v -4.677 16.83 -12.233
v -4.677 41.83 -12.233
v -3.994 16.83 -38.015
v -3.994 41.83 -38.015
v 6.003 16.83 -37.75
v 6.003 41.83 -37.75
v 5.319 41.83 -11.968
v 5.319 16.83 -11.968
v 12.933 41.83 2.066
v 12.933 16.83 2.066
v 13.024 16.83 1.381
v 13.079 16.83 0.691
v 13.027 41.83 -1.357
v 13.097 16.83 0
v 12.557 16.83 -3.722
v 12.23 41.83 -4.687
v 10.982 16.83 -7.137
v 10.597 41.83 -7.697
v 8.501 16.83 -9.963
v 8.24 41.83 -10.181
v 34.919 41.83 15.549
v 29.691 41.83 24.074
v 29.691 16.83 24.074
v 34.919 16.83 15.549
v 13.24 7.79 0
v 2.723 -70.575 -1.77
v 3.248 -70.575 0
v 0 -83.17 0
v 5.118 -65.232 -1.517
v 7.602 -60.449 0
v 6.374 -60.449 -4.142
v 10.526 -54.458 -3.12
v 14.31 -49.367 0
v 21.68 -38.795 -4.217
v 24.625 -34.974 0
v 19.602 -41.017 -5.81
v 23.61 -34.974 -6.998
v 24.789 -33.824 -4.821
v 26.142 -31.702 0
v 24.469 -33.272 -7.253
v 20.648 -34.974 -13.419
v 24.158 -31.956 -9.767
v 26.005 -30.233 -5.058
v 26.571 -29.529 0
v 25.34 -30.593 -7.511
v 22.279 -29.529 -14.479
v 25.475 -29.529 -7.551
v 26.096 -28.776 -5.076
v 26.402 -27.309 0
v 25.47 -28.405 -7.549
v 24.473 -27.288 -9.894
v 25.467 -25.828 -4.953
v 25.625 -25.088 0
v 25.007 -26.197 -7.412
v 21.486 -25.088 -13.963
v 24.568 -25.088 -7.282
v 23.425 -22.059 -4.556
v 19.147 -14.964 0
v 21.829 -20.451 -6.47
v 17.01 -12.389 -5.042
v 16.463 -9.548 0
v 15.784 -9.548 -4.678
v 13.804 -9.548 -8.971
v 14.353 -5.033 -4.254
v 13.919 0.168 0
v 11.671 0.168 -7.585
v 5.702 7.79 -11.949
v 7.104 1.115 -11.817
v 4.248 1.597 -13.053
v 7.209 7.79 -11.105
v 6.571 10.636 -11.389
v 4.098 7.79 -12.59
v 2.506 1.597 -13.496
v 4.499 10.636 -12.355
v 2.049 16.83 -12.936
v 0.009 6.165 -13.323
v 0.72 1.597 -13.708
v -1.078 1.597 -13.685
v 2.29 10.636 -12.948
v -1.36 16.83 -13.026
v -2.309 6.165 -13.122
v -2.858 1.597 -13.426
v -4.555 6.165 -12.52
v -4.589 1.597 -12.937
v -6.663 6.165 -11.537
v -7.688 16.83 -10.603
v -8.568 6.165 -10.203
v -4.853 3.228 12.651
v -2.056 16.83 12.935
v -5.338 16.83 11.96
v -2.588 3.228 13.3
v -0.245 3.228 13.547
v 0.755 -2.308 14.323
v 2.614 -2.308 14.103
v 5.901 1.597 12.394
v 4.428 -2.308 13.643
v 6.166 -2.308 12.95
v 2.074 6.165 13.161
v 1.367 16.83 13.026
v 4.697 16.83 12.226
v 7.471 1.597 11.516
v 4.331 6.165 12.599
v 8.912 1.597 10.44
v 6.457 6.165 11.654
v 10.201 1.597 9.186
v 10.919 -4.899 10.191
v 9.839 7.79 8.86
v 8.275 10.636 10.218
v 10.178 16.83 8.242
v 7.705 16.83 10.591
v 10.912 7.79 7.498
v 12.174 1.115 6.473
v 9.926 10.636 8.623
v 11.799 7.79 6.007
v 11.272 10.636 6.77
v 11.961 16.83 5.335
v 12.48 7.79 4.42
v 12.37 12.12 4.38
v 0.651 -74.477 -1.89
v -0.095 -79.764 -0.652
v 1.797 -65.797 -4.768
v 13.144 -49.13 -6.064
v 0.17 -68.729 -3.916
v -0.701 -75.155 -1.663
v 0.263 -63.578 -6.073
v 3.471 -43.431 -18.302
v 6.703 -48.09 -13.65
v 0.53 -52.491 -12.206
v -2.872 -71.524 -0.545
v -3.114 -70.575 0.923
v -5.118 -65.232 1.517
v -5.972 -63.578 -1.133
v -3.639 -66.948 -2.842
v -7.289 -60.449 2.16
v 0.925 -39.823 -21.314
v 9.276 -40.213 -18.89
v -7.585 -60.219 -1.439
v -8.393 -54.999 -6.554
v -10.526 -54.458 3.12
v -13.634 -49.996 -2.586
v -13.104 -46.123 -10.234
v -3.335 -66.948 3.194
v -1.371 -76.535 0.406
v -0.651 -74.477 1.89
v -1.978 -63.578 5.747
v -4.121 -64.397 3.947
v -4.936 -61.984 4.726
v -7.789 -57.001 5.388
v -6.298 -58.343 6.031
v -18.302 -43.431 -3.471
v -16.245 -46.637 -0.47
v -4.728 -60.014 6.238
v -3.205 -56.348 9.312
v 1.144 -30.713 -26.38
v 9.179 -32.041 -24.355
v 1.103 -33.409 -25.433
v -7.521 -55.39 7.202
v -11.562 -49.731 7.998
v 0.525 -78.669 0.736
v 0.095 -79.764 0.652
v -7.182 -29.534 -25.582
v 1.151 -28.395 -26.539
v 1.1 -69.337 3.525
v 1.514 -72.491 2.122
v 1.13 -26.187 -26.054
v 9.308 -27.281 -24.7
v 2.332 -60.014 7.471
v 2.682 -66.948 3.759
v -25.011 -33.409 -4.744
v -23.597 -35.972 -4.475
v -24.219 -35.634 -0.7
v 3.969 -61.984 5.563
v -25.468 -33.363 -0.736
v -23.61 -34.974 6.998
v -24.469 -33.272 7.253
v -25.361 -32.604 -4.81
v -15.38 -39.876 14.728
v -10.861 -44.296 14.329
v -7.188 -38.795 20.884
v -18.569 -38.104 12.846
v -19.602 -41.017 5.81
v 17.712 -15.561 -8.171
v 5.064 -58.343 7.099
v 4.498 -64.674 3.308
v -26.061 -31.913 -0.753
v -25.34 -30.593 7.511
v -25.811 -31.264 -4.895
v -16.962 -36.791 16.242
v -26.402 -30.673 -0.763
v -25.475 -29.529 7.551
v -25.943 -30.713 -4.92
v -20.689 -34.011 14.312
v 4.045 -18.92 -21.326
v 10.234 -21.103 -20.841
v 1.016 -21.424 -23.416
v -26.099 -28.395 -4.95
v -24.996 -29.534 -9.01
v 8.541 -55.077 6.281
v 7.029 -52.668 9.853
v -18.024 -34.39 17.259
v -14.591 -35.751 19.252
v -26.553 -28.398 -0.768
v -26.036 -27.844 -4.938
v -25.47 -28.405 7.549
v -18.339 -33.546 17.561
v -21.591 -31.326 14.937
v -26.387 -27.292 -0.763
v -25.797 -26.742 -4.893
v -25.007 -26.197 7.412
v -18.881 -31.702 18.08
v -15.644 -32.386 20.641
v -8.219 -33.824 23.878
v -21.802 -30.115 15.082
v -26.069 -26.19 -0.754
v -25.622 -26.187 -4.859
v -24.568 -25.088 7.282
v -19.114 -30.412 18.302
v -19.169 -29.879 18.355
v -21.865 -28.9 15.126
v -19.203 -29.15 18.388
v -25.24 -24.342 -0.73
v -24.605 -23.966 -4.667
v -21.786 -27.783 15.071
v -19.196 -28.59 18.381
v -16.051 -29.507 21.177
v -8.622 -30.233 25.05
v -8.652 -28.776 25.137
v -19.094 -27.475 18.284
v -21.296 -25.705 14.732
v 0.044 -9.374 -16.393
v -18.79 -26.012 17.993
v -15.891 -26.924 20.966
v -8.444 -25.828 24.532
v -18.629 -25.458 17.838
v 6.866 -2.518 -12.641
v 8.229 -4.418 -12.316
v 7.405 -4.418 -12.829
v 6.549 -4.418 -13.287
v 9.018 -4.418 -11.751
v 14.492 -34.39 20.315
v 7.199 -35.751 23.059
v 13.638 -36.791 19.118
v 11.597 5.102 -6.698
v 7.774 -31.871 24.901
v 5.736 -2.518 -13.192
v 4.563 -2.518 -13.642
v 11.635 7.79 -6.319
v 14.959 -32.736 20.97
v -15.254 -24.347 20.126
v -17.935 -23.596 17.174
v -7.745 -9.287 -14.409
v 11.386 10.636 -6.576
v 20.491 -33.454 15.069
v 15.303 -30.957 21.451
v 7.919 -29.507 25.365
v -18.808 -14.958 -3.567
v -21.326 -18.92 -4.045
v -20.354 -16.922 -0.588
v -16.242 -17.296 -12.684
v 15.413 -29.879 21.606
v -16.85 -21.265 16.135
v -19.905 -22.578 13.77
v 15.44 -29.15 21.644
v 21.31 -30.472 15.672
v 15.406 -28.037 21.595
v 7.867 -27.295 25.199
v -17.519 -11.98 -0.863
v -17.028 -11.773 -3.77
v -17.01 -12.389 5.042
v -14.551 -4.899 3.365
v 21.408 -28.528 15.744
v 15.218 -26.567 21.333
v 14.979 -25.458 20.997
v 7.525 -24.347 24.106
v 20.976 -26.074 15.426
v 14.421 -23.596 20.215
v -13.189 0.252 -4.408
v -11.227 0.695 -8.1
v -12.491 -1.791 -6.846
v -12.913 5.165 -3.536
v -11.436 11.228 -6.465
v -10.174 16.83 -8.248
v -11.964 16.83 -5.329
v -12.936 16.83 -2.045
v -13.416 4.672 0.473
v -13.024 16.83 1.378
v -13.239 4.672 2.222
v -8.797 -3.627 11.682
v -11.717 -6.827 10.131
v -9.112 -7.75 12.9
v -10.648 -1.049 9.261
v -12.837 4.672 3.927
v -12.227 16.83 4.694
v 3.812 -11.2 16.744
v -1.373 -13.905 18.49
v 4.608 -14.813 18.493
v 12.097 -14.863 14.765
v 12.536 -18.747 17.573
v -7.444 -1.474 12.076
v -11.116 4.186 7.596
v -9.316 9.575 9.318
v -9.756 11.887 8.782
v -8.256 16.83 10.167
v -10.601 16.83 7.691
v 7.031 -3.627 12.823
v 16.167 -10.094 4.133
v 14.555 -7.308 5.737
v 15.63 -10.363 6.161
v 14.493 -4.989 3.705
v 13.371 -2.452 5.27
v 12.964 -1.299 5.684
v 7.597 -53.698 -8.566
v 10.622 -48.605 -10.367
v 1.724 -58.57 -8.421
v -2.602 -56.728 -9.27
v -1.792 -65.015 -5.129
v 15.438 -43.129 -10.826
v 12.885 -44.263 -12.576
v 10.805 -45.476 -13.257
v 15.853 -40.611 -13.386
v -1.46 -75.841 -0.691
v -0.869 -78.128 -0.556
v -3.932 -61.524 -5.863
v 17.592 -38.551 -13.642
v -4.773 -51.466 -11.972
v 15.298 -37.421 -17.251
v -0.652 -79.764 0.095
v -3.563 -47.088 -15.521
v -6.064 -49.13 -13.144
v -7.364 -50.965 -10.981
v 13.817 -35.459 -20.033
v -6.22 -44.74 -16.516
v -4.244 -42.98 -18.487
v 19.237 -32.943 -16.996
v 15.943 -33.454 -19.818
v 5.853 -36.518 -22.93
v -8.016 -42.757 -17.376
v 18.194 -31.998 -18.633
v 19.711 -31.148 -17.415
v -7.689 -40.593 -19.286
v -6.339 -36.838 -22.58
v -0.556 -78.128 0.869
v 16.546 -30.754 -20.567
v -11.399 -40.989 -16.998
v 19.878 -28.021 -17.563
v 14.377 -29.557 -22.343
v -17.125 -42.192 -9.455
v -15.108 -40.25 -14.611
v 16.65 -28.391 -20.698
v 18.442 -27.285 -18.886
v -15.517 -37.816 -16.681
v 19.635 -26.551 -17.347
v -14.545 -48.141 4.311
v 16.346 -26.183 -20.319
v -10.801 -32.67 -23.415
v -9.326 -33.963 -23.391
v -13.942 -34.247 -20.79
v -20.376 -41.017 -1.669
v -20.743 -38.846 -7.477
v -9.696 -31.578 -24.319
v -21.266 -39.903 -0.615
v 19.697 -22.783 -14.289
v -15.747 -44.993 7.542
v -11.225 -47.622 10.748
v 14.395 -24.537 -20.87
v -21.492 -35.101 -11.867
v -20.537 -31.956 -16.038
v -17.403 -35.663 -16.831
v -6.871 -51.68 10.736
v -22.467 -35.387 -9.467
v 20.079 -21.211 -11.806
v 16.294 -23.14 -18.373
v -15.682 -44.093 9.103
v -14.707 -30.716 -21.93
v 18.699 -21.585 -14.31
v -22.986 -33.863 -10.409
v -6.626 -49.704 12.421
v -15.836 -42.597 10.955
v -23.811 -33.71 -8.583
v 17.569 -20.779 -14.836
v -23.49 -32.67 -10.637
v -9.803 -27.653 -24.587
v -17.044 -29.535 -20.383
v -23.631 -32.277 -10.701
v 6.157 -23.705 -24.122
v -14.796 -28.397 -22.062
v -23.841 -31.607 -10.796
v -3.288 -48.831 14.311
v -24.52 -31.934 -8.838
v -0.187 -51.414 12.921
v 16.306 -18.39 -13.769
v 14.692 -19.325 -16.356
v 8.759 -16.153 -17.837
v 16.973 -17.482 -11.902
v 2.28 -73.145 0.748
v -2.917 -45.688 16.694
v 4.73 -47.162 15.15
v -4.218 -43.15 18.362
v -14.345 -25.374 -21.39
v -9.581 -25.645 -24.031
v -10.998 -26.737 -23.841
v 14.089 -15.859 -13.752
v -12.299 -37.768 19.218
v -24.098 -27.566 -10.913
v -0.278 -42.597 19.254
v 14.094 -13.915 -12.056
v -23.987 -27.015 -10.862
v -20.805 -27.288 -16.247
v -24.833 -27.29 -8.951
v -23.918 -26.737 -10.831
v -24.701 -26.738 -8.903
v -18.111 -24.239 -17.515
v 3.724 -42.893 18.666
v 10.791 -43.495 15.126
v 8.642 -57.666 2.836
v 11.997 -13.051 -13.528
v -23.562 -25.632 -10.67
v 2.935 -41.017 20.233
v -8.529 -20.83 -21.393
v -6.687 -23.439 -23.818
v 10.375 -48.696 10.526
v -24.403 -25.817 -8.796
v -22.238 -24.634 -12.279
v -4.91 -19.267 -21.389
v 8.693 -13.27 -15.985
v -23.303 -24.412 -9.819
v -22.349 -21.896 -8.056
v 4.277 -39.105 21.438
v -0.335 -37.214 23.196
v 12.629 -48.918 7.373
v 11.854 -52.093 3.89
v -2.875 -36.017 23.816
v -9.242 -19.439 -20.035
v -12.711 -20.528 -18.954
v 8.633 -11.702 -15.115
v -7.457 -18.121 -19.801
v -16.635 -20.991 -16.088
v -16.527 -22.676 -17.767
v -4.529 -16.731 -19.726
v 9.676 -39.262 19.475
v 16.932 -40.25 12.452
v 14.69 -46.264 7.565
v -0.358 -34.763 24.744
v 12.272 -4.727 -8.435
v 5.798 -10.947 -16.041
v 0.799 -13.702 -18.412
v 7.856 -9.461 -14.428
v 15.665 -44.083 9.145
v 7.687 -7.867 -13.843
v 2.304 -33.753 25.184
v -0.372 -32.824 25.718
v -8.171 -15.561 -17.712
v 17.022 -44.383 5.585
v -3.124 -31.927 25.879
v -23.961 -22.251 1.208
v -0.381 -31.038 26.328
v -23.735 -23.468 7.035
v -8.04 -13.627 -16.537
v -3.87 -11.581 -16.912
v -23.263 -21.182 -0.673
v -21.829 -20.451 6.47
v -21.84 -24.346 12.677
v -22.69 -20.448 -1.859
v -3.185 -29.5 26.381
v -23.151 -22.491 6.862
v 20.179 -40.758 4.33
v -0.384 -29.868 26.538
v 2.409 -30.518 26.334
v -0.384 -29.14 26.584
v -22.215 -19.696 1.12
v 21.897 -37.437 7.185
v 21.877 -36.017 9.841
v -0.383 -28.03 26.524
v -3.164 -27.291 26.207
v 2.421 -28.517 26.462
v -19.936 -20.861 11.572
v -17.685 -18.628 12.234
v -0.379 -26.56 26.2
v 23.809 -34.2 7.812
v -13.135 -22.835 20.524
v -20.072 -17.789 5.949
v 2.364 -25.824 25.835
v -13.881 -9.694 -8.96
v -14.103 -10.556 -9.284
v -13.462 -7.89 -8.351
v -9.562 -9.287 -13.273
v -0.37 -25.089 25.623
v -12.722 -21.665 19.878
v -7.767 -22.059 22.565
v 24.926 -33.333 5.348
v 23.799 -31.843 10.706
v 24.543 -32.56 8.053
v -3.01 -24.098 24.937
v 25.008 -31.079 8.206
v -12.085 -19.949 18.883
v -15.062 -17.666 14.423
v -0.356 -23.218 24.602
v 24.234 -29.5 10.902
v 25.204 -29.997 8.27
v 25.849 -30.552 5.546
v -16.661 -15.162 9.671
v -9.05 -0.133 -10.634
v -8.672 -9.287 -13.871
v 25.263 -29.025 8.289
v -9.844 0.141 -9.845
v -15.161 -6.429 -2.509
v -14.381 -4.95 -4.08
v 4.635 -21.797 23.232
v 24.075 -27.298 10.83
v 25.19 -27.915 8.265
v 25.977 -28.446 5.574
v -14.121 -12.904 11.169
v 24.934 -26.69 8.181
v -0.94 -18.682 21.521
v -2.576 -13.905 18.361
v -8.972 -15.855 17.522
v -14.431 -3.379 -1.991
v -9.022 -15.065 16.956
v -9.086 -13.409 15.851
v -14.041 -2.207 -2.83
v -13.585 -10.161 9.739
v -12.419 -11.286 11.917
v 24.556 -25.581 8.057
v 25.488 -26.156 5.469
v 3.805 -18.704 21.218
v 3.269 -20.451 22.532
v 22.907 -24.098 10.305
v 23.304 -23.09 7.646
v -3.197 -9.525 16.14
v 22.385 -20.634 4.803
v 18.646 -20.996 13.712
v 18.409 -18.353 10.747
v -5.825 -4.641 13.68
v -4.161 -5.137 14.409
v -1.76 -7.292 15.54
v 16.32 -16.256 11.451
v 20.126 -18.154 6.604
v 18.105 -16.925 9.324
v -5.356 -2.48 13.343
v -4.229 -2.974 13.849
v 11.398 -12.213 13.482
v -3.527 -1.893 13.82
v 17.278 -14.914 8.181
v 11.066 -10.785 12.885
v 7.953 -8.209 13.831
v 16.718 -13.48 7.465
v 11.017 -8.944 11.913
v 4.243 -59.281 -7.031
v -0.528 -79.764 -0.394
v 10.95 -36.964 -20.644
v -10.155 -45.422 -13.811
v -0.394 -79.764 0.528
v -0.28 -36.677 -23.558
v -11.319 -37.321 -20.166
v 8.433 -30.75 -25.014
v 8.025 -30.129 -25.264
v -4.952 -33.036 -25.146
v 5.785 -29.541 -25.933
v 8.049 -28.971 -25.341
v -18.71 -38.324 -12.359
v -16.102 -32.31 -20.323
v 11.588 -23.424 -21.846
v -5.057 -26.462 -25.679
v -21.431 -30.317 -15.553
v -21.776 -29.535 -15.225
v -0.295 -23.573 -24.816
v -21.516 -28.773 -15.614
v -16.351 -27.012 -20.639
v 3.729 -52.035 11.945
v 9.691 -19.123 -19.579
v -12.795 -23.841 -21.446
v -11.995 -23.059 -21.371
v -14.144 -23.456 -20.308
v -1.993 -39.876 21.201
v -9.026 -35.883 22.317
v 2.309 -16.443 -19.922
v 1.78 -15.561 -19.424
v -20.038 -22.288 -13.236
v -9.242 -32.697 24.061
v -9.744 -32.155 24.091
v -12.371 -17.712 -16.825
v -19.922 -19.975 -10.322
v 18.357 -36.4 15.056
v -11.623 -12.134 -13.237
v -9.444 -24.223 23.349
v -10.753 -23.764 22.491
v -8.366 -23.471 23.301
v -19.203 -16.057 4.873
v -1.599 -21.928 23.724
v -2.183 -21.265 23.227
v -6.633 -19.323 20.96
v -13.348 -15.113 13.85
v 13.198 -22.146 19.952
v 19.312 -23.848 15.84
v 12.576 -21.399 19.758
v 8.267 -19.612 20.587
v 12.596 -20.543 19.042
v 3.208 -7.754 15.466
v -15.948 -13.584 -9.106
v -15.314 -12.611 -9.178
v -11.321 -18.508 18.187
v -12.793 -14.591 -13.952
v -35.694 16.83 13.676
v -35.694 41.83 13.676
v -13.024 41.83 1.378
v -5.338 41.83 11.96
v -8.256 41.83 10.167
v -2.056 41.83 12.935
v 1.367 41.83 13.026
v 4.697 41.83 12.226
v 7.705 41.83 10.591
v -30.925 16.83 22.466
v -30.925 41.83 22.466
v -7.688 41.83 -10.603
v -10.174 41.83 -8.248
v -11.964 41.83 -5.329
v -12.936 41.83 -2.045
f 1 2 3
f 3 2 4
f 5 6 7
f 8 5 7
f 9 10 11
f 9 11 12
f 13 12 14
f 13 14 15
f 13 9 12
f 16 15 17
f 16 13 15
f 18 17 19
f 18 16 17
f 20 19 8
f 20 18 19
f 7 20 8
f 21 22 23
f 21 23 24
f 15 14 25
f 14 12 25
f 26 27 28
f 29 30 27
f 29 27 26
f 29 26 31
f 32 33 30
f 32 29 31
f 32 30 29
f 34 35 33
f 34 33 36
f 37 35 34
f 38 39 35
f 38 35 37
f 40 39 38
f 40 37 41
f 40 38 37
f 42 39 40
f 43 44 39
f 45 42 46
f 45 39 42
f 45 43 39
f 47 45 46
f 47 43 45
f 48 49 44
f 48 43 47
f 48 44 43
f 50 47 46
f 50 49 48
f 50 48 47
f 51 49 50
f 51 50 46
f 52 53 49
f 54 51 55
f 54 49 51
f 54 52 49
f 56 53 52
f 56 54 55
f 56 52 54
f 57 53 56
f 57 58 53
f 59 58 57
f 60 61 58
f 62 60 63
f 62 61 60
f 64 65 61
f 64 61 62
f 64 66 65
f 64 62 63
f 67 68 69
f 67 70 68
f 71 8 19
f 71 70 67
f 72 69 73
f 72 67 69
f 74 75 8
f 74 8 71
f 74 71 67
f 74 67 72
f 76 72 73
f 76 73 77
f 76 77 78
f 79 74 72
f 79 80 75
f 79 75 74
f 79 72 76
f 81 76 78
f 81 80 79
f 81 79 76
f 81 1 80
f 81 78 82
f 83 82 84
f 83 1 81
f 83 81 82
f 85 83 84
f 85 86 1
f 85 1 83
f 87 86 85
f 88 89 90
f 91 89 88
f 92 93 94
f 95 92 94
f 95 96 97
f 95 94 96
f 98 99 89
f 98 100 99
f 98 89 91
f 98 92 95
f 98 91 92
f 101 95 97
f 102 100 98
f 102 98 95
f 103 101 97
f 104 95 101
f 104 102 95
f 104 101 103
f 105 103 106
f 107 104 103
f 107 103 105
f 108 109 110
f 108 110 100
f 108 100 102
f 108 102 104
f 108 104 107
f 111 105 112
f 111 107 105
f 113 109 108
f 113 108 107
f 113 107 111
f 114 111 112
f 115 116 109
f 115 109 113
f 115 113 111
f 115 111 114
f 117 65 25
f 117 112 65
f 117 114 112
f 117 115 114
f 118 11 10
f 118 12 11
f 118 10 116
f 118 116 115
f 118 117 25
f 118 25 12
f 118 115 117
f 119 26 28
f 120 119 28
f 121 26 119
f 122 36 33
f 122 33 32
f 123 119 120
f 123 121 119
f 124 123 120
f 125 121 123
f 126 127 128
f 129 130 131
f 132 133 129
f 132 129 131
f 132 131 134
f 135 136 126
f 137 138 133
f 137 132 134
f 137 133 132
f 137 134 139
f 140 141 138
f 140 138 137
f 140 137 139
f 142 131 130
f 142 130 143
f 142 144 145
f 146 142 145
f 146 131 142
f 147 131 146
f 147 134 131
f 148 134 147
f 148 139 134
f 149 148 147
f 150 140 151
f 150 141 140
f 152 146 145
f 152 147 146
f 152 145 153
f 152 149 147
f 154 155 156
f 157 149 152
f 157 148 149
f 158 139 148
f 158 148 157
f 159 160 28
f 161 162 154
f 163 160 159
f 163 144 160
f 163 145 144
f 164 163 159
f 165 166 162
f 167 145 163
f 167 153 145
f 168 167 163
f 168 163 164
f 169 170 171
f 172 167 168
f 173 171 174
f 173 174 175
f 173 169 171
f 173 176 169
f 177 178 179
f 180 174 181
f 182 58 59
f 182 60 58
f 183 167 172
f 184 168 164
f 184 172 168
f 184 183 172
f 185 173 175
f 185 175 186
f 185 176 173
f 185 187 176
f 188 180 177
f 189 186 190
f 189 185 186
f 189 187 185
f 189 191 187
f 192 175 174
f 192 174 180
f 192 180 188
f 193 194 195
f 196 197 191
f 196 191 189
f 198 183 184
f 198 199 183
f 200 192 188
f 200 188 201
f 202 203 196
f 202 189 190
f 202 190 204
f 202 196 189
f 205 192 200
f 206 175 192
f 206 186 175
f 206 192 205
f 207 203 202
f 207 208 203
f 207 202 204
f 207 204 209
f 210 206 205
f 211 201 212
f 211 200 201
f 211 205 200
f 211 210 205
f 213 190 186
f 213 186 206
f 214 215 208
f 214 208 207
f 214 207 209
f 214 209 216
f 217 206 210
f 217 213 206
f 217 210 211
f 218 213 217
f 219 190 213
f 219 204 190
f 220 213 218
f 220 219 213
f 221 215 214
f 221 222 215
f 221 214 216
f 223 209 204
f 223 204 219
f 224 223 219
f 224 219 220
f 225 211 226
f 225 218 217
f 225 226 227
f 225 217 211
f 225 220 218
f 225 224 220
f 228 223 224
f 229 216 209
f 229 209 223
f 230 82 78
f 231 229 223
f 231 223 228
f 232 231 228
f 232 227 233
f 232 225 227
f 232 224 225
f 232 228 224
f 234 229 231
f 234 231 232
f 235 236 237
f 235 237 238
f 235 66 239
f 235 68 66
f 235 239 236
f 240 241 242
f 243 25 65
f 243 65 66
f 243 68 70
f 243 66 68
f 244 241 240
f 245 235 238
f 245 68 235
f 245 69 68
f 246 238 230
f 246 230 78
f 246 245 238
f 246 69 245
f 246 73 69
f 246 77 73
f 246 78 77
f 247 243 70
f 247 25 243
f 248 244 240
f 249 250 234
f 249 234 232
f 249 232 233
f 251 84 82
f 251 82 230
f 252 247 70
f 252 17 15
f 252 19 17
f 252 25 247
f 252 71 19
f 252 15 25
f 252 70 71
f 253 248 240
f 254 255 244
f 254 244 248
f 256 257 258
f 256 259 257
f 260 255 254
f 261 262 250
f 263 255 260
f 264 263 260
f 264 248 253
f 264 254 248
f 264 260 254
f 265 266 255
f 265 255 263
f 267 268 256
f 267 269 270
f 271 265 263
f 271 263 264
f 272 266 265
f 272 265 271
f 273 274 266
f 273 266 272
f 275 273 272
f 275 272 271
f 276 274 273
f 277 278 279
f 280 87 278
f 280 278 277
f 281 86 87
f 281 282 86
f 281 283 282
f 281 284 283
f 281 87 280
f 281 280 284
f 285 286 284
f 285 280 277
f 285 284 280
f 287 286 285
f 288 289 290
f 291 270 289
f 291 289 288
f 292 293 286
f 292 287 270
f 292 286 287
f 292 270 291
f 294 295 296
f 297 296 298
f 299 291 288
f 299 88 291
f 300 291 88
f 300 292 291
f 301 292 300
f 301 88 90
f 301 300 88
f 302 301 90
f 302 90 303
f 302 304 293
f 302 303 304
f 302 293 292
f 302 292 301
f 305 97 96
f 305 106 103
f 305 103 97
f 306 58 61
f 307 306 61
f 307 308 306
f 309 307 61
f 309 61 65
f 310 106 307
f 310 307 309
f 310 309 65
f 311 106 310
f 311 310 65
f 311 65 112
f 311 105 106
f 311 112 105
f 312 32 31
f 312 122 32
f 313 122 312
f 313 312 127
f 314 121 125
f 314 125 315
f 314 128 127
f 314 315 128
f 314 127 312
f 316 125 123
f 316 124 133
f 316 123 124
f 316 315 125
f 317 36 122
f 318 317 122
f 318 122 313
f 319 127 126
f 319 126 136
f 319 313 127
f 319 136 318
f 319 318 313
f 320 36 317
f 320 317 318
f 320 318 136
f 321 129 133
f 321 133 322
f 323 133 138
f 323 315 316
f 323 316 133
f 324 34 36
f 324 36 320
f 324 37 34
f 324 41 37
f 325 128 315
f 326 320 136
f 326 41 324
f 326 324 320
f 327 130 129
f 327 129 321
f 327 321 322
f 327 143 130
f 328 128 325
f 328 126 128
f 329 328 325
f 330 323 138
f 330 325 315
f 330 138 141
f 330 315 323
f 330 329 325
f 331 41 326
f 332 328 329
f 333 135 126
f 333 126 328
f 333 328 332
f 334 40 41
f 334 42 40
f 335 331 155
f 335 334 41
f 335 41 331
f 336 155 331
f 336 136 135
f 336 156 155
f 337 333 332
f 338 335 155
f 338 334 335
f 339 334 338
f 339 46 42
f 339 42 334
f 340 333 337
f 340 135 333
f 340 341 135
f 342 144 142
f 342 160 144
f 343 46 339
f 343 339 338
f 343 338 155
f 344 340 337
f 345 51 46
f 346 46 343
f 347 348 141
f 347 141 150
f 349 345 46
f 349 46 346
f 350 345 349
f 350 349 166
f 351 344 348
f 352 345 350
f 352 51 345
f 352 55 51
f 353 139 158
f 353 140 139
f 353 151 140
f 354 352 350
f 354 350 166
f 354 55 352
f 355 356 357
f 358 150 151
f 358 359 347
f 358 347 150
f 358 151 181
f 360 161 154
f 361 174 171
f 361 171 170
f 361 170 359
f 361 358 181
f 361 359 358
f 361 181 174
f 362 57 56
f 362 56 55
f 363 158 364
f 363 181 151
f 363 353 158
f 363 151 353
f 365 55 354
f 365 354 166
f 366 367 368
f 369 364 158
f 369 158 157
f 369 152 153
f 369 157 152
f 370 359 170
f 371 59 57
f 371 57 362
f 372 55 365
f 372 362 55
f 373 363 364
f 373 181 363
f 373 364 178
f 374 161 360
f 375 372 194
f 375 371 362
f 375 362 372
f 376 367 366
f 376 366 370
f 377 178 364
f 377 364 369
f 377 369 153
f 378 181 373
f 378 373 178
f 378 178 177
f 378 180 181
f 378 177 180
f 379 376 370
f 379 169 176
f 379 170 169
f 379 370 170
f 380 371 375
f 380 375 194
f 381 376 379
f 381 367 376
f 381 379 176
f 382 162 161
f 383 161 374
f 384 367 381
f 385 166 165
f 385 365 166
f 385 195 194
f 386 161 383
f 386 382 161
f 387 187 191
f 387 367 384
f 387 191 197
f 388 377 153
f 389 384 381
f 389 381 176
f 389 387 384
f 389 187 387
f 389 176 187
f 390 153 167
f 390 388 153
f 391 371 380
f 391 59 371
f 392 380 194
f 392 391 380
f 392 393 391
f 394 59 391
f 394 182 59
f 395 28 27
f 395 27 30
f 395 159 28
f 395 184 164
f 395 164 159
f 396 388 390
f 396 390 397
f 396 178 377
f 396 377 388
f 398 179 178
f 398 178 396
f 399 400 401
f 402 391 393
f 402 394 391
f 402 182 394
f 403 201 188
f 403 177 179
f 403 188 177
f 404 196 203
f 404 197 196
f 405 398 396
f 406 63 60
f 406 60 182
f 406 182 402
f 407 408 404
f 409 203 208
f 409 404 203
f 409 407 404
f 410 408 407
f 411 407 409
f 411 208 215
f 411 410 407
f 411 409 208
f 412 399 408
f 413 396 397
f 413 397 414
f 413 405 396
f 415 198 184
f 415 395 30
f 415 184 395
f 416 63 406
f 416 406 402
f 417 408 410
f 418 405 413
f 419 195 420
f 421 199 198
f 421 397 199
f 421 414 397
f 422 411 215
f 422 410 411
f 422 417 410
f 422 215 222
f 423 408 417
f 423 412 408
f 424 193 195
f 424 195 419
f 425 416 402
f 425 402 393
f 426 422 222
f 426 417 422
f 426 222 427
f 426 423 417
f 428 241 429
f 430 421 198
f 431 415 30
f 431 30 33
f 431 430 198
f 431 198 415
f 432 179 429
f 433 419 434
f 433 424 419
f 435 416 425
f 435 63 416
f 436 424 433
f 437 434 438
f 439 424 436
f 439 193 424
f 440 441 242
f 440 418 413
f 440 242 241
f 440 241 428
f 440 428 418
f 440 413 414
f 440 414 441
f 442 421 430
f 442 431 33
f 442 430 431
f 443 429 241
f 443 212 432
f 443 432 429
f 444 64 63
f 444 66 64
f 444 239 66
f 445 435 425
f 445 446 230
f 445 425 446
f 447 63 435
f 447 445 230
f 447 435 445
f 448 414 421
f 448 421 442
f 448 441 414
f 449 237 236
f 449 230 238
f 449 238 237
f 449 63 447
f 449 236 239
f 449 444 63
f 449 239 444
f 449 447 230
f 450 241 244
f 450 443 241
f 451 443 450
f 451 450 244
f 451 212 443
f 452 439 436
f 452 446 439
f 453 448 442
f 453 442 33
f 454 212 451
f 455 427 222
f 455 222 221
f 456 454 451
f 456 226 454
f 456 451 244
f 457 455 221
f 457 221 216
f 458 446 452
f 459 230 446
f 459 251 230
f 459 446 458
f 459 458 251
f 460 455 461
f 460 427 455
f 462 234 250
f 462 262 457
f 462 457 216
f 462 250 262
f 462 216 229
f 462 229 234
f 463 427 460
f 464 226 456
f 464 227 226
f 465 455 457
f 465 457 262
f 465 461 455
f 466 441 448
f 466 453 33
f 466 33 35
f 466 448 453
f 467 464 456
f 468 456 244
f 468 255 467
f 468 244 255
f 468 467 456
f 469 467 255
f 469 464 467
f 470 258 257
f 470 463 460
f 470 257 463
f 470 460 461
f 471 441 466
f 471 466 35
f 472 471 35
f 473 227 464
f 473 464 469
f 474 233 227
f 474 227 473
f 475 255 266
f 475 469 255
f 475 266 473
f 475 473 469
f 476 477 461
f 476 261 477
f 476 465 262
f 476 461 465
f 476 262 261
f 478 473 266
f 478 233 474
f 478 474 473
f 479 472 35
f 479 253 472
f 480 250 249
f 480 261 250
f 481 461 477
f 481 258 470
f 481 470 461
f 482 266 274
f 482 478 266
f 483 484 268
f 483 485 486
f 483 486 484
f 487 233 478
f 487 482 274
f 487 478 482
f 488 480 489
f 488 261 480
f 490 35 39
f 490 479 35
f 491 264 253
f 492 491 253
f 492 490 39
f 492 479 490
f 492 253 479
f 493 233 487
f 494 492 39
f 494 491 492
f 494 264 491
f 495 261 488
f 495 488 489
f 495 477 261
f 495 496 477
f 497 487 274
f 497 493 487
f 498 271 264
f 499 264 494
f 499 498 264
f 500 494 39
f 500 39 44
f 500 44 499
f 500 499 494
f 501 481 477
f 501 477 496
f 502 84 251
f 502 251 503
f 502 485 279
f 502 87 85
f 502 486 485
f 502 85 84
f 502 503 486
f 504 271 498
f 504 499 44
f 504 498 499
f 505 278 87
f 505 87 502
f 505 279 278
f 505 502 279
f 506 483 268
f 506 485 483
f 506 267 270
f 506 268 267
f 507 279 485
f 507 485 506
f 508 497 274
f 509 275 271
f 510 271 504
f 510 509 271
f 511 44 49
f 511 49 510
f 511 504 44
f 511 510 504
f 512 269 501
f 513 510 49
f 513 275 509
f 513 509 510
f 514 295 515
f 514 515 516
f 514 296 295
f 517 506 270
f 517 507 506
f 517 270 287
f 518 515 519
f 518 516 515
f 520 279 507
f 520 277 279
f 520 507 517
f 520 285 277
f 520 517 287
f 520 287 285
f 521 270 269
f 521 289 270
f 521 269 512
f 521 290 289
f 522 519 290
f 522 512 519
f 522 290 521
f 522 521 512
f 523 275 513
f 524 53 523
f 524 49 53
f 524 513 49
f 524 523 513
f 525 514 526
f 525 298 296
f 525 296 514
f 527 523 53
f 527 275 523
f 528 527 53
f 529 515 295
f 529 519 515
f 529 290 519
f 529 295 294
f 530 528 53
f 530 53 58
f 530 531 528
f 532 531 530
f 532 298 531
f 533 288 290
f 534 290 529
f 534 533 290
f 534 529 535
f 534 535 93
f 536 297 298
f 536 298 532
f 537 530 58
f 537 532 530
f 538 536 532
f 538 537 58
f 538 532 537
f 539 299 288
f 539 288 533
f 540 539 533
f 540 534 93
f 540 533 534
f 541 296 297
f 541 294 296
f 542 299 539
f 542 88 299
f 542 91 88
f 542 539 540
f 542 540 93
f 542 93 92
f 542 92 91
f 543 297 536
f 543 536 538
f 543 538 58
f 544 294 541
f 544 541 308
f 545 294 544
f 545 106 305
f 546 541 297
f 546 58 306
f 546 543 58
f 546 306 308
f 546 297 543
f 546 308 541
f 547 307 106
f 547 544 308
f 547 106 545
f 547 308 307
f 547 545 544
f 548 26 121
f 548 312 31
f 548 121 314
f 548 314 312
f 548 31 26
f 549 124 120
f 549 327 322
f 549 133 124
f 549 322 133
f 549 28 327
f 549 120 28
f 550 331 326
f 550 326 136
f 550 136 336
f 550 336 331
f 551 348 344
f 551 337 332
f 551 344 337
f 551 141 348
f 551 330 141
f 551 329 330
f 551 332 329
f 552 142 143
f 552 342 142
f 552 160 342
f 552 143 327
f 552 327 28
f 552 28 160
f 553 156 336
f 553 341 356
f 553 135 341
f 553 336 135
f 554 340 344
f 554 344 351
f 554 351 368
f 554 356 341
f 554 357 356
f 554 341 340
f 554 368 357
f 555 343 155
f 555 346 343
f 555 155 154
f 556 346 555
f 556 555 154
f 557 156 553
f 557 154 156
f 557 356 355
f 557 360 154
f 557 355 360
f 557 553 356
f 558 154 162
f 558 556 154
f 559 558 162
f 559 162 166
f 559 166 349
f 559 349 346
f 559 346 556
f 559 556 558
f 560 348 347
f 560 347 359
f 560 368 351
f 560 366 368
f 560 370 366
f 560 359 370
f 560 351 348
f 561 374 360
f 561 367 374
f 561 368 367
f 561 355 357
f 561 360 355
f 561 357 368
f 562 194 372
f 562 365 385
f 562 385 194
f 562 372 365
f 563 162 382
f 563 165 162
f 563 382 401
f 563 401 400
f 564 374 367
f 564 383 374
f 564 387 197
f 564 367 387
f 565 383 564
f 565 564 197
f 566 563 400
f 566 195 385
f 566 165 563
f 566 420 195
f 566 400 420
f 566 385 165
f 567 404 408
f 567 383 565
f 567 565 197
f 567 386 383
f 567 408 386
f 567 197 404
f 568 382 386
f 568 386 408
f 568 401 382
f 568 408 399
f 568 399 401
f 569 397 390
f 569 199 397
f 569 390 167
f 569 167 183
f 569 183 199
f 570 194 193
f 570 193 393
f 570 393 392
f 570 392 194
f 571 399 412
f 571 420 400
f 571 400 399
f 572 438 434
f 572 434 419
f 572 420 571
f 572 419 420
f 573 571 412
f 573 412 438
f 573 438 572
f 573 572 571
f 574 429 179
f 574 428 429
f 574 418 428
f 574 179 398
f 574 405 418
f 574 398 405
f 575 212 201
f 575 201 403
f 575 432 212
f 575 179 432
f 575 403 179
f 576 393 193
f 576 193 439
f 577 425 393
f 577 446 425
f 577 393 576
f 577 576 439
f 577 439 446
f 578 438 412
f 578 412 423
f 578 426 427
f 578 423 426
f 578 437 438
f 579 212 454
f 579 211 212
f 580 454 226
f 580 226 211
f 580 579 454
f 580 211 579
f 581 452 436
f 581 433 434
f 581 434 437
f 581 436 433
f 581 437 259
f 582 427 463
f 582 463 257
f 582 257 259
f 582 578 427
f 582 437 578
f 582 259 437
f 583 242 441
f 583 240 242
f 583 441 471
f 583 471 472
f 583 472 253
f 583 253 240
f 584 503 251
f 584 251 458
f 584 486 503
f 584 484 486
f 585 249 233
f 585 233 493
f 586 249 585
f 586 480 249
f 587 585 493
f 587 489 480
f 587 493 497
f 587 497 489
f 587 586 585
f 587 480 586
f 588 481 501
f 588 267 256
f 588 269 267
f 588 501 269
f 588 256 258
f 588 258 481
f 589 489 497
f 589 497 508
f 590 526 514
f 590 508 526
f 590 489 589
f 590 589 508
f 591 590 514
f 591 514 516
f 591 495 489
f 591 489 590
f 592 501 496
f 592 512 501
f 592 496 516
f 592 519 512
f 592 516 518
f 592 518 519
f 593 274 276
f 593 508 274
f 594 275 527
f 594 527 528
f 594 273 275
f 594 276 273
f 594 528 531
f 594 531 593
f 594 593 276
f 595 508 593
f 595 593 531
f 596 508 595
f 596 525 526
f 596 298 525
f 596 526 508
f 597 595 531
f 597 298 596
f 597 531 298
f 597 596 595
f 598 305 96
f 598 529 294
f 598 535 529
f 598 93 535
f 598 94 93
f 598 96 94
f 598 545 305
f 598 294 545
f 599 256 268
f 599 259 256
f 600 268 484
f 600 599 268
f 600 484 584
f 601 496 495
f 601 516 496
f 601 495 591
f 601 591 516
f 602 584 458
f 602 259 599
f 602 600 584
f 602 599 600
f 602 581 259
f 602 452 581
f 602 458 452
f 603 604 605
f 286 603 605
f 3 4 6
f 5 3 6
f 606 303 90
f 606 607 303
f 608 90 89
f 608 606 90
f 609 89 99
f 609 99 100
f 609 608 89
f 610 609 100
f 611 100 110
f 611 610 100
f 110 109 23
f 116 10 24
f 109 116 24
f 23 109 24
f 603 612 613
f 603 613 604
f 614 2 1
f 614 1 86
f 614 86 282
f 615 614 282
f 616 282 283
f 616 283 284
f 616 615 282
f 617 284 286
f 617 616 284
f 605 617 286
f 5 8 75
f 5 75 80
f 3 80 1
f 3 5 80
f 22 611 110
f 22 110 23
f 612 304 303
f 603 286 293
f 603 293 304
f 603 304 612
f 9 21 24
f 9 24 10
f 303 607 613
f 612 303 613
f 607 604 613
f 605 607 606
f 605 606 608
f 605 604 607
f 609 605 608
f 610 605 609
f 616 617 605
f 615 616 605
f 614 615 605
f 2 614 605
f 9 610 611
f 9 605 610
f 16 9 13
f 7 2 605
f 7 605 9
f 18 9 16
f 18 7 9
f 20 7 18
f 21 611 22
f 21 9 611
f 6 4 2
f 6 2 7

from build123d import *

# Parameters (mm, degrees)
BOSS_EXTRUDE3_START = 25
BOSS_EXTRUDE3_DEPTH = 25


# Read off the part's stored shape, not the designer's step: Revolve1
with BuildPart() as part:
    # Revolve1 outline → Revolve1 (revolve)
    with BuildSketch(Plane.XY):
        with BuildLine():
            add(Edge.make_bspline(
                [(0, -83.170194275), (9.196233186, -29.383544719), (56.312104062, -30.117818032), (14.458525258, -24.733147074), (13.097094087, -14.008197046), (13.097094087, 16.829805725)],
                knots=[0, 0, 0, 0, 0, 0, 1, 1, 1, 1, 1, 1], degree=5))
            Line((13.097094087, 16.829805725), (13.097094087, 41.829805725))
            Line((13.097094087, 41.829805725), (0, 41.829805725))
            Line((0, 41.829805725), (0, -83.170194275))
        make_face()
    revolve(axis=Axis((0, 0, 0), (0, 1, 0)))

    # Sketch5 → Boss-Extrude3 (add)
    with BuildSketch(Plane(origin=(0, 16.829805725, 0), x_dir=(1, 0, 0), z_dir=(0, 1, 0)).offset(BOSS_EXTRUDE3_START)):
        with BuildLine():
            Line((-30.925152295, -22.466241313), (-35.69384323, -13.676498042))
            Line((-35.69384323, -13.676498042), (-13.024433115, -1.377684848))
            ThreePointArc((-13.024433115, -1.377684848), (-11.512009462, -6.245599384), (-8.255742181, -10.167428119))
            Line((-8.255742181, -10.167428119), (-30.925152295, -22.466241313))
        make_face()
        with BuildLine():
            Line((29.691116354, -24.073525975), (34.918911852, -15.548846847))
            Line((34.918911852, -15.548846847), (12.933122133, -2.065968396))
            ThreePointArc((12.933122133, -2.065968396), (11.164852459, -6.846892951), (7.705326635, -10.590647524))
            Line((7.705326635, -10.590647524), (29.691116354, -24.073525975))
        make_face()
        with BuildLine():
            Line((6.002726876, 37.750024016), (5.319106481, 11.968332372))
            ThreePointArc((5.319106481, 11.968332372), (0.347157002, 13.092492335), (-4.677379952, 12.233396515))
            Line((-4.677379952, 12.233396515), (-3.993759557, 38.01508816))
            Line((-3.993759557, 38.01508816), (6.002726876, 37.750024016))
        make_face()
    extrude(amount=-BOSS_EXTRUDE3_DEPTH)


solid = part.part
